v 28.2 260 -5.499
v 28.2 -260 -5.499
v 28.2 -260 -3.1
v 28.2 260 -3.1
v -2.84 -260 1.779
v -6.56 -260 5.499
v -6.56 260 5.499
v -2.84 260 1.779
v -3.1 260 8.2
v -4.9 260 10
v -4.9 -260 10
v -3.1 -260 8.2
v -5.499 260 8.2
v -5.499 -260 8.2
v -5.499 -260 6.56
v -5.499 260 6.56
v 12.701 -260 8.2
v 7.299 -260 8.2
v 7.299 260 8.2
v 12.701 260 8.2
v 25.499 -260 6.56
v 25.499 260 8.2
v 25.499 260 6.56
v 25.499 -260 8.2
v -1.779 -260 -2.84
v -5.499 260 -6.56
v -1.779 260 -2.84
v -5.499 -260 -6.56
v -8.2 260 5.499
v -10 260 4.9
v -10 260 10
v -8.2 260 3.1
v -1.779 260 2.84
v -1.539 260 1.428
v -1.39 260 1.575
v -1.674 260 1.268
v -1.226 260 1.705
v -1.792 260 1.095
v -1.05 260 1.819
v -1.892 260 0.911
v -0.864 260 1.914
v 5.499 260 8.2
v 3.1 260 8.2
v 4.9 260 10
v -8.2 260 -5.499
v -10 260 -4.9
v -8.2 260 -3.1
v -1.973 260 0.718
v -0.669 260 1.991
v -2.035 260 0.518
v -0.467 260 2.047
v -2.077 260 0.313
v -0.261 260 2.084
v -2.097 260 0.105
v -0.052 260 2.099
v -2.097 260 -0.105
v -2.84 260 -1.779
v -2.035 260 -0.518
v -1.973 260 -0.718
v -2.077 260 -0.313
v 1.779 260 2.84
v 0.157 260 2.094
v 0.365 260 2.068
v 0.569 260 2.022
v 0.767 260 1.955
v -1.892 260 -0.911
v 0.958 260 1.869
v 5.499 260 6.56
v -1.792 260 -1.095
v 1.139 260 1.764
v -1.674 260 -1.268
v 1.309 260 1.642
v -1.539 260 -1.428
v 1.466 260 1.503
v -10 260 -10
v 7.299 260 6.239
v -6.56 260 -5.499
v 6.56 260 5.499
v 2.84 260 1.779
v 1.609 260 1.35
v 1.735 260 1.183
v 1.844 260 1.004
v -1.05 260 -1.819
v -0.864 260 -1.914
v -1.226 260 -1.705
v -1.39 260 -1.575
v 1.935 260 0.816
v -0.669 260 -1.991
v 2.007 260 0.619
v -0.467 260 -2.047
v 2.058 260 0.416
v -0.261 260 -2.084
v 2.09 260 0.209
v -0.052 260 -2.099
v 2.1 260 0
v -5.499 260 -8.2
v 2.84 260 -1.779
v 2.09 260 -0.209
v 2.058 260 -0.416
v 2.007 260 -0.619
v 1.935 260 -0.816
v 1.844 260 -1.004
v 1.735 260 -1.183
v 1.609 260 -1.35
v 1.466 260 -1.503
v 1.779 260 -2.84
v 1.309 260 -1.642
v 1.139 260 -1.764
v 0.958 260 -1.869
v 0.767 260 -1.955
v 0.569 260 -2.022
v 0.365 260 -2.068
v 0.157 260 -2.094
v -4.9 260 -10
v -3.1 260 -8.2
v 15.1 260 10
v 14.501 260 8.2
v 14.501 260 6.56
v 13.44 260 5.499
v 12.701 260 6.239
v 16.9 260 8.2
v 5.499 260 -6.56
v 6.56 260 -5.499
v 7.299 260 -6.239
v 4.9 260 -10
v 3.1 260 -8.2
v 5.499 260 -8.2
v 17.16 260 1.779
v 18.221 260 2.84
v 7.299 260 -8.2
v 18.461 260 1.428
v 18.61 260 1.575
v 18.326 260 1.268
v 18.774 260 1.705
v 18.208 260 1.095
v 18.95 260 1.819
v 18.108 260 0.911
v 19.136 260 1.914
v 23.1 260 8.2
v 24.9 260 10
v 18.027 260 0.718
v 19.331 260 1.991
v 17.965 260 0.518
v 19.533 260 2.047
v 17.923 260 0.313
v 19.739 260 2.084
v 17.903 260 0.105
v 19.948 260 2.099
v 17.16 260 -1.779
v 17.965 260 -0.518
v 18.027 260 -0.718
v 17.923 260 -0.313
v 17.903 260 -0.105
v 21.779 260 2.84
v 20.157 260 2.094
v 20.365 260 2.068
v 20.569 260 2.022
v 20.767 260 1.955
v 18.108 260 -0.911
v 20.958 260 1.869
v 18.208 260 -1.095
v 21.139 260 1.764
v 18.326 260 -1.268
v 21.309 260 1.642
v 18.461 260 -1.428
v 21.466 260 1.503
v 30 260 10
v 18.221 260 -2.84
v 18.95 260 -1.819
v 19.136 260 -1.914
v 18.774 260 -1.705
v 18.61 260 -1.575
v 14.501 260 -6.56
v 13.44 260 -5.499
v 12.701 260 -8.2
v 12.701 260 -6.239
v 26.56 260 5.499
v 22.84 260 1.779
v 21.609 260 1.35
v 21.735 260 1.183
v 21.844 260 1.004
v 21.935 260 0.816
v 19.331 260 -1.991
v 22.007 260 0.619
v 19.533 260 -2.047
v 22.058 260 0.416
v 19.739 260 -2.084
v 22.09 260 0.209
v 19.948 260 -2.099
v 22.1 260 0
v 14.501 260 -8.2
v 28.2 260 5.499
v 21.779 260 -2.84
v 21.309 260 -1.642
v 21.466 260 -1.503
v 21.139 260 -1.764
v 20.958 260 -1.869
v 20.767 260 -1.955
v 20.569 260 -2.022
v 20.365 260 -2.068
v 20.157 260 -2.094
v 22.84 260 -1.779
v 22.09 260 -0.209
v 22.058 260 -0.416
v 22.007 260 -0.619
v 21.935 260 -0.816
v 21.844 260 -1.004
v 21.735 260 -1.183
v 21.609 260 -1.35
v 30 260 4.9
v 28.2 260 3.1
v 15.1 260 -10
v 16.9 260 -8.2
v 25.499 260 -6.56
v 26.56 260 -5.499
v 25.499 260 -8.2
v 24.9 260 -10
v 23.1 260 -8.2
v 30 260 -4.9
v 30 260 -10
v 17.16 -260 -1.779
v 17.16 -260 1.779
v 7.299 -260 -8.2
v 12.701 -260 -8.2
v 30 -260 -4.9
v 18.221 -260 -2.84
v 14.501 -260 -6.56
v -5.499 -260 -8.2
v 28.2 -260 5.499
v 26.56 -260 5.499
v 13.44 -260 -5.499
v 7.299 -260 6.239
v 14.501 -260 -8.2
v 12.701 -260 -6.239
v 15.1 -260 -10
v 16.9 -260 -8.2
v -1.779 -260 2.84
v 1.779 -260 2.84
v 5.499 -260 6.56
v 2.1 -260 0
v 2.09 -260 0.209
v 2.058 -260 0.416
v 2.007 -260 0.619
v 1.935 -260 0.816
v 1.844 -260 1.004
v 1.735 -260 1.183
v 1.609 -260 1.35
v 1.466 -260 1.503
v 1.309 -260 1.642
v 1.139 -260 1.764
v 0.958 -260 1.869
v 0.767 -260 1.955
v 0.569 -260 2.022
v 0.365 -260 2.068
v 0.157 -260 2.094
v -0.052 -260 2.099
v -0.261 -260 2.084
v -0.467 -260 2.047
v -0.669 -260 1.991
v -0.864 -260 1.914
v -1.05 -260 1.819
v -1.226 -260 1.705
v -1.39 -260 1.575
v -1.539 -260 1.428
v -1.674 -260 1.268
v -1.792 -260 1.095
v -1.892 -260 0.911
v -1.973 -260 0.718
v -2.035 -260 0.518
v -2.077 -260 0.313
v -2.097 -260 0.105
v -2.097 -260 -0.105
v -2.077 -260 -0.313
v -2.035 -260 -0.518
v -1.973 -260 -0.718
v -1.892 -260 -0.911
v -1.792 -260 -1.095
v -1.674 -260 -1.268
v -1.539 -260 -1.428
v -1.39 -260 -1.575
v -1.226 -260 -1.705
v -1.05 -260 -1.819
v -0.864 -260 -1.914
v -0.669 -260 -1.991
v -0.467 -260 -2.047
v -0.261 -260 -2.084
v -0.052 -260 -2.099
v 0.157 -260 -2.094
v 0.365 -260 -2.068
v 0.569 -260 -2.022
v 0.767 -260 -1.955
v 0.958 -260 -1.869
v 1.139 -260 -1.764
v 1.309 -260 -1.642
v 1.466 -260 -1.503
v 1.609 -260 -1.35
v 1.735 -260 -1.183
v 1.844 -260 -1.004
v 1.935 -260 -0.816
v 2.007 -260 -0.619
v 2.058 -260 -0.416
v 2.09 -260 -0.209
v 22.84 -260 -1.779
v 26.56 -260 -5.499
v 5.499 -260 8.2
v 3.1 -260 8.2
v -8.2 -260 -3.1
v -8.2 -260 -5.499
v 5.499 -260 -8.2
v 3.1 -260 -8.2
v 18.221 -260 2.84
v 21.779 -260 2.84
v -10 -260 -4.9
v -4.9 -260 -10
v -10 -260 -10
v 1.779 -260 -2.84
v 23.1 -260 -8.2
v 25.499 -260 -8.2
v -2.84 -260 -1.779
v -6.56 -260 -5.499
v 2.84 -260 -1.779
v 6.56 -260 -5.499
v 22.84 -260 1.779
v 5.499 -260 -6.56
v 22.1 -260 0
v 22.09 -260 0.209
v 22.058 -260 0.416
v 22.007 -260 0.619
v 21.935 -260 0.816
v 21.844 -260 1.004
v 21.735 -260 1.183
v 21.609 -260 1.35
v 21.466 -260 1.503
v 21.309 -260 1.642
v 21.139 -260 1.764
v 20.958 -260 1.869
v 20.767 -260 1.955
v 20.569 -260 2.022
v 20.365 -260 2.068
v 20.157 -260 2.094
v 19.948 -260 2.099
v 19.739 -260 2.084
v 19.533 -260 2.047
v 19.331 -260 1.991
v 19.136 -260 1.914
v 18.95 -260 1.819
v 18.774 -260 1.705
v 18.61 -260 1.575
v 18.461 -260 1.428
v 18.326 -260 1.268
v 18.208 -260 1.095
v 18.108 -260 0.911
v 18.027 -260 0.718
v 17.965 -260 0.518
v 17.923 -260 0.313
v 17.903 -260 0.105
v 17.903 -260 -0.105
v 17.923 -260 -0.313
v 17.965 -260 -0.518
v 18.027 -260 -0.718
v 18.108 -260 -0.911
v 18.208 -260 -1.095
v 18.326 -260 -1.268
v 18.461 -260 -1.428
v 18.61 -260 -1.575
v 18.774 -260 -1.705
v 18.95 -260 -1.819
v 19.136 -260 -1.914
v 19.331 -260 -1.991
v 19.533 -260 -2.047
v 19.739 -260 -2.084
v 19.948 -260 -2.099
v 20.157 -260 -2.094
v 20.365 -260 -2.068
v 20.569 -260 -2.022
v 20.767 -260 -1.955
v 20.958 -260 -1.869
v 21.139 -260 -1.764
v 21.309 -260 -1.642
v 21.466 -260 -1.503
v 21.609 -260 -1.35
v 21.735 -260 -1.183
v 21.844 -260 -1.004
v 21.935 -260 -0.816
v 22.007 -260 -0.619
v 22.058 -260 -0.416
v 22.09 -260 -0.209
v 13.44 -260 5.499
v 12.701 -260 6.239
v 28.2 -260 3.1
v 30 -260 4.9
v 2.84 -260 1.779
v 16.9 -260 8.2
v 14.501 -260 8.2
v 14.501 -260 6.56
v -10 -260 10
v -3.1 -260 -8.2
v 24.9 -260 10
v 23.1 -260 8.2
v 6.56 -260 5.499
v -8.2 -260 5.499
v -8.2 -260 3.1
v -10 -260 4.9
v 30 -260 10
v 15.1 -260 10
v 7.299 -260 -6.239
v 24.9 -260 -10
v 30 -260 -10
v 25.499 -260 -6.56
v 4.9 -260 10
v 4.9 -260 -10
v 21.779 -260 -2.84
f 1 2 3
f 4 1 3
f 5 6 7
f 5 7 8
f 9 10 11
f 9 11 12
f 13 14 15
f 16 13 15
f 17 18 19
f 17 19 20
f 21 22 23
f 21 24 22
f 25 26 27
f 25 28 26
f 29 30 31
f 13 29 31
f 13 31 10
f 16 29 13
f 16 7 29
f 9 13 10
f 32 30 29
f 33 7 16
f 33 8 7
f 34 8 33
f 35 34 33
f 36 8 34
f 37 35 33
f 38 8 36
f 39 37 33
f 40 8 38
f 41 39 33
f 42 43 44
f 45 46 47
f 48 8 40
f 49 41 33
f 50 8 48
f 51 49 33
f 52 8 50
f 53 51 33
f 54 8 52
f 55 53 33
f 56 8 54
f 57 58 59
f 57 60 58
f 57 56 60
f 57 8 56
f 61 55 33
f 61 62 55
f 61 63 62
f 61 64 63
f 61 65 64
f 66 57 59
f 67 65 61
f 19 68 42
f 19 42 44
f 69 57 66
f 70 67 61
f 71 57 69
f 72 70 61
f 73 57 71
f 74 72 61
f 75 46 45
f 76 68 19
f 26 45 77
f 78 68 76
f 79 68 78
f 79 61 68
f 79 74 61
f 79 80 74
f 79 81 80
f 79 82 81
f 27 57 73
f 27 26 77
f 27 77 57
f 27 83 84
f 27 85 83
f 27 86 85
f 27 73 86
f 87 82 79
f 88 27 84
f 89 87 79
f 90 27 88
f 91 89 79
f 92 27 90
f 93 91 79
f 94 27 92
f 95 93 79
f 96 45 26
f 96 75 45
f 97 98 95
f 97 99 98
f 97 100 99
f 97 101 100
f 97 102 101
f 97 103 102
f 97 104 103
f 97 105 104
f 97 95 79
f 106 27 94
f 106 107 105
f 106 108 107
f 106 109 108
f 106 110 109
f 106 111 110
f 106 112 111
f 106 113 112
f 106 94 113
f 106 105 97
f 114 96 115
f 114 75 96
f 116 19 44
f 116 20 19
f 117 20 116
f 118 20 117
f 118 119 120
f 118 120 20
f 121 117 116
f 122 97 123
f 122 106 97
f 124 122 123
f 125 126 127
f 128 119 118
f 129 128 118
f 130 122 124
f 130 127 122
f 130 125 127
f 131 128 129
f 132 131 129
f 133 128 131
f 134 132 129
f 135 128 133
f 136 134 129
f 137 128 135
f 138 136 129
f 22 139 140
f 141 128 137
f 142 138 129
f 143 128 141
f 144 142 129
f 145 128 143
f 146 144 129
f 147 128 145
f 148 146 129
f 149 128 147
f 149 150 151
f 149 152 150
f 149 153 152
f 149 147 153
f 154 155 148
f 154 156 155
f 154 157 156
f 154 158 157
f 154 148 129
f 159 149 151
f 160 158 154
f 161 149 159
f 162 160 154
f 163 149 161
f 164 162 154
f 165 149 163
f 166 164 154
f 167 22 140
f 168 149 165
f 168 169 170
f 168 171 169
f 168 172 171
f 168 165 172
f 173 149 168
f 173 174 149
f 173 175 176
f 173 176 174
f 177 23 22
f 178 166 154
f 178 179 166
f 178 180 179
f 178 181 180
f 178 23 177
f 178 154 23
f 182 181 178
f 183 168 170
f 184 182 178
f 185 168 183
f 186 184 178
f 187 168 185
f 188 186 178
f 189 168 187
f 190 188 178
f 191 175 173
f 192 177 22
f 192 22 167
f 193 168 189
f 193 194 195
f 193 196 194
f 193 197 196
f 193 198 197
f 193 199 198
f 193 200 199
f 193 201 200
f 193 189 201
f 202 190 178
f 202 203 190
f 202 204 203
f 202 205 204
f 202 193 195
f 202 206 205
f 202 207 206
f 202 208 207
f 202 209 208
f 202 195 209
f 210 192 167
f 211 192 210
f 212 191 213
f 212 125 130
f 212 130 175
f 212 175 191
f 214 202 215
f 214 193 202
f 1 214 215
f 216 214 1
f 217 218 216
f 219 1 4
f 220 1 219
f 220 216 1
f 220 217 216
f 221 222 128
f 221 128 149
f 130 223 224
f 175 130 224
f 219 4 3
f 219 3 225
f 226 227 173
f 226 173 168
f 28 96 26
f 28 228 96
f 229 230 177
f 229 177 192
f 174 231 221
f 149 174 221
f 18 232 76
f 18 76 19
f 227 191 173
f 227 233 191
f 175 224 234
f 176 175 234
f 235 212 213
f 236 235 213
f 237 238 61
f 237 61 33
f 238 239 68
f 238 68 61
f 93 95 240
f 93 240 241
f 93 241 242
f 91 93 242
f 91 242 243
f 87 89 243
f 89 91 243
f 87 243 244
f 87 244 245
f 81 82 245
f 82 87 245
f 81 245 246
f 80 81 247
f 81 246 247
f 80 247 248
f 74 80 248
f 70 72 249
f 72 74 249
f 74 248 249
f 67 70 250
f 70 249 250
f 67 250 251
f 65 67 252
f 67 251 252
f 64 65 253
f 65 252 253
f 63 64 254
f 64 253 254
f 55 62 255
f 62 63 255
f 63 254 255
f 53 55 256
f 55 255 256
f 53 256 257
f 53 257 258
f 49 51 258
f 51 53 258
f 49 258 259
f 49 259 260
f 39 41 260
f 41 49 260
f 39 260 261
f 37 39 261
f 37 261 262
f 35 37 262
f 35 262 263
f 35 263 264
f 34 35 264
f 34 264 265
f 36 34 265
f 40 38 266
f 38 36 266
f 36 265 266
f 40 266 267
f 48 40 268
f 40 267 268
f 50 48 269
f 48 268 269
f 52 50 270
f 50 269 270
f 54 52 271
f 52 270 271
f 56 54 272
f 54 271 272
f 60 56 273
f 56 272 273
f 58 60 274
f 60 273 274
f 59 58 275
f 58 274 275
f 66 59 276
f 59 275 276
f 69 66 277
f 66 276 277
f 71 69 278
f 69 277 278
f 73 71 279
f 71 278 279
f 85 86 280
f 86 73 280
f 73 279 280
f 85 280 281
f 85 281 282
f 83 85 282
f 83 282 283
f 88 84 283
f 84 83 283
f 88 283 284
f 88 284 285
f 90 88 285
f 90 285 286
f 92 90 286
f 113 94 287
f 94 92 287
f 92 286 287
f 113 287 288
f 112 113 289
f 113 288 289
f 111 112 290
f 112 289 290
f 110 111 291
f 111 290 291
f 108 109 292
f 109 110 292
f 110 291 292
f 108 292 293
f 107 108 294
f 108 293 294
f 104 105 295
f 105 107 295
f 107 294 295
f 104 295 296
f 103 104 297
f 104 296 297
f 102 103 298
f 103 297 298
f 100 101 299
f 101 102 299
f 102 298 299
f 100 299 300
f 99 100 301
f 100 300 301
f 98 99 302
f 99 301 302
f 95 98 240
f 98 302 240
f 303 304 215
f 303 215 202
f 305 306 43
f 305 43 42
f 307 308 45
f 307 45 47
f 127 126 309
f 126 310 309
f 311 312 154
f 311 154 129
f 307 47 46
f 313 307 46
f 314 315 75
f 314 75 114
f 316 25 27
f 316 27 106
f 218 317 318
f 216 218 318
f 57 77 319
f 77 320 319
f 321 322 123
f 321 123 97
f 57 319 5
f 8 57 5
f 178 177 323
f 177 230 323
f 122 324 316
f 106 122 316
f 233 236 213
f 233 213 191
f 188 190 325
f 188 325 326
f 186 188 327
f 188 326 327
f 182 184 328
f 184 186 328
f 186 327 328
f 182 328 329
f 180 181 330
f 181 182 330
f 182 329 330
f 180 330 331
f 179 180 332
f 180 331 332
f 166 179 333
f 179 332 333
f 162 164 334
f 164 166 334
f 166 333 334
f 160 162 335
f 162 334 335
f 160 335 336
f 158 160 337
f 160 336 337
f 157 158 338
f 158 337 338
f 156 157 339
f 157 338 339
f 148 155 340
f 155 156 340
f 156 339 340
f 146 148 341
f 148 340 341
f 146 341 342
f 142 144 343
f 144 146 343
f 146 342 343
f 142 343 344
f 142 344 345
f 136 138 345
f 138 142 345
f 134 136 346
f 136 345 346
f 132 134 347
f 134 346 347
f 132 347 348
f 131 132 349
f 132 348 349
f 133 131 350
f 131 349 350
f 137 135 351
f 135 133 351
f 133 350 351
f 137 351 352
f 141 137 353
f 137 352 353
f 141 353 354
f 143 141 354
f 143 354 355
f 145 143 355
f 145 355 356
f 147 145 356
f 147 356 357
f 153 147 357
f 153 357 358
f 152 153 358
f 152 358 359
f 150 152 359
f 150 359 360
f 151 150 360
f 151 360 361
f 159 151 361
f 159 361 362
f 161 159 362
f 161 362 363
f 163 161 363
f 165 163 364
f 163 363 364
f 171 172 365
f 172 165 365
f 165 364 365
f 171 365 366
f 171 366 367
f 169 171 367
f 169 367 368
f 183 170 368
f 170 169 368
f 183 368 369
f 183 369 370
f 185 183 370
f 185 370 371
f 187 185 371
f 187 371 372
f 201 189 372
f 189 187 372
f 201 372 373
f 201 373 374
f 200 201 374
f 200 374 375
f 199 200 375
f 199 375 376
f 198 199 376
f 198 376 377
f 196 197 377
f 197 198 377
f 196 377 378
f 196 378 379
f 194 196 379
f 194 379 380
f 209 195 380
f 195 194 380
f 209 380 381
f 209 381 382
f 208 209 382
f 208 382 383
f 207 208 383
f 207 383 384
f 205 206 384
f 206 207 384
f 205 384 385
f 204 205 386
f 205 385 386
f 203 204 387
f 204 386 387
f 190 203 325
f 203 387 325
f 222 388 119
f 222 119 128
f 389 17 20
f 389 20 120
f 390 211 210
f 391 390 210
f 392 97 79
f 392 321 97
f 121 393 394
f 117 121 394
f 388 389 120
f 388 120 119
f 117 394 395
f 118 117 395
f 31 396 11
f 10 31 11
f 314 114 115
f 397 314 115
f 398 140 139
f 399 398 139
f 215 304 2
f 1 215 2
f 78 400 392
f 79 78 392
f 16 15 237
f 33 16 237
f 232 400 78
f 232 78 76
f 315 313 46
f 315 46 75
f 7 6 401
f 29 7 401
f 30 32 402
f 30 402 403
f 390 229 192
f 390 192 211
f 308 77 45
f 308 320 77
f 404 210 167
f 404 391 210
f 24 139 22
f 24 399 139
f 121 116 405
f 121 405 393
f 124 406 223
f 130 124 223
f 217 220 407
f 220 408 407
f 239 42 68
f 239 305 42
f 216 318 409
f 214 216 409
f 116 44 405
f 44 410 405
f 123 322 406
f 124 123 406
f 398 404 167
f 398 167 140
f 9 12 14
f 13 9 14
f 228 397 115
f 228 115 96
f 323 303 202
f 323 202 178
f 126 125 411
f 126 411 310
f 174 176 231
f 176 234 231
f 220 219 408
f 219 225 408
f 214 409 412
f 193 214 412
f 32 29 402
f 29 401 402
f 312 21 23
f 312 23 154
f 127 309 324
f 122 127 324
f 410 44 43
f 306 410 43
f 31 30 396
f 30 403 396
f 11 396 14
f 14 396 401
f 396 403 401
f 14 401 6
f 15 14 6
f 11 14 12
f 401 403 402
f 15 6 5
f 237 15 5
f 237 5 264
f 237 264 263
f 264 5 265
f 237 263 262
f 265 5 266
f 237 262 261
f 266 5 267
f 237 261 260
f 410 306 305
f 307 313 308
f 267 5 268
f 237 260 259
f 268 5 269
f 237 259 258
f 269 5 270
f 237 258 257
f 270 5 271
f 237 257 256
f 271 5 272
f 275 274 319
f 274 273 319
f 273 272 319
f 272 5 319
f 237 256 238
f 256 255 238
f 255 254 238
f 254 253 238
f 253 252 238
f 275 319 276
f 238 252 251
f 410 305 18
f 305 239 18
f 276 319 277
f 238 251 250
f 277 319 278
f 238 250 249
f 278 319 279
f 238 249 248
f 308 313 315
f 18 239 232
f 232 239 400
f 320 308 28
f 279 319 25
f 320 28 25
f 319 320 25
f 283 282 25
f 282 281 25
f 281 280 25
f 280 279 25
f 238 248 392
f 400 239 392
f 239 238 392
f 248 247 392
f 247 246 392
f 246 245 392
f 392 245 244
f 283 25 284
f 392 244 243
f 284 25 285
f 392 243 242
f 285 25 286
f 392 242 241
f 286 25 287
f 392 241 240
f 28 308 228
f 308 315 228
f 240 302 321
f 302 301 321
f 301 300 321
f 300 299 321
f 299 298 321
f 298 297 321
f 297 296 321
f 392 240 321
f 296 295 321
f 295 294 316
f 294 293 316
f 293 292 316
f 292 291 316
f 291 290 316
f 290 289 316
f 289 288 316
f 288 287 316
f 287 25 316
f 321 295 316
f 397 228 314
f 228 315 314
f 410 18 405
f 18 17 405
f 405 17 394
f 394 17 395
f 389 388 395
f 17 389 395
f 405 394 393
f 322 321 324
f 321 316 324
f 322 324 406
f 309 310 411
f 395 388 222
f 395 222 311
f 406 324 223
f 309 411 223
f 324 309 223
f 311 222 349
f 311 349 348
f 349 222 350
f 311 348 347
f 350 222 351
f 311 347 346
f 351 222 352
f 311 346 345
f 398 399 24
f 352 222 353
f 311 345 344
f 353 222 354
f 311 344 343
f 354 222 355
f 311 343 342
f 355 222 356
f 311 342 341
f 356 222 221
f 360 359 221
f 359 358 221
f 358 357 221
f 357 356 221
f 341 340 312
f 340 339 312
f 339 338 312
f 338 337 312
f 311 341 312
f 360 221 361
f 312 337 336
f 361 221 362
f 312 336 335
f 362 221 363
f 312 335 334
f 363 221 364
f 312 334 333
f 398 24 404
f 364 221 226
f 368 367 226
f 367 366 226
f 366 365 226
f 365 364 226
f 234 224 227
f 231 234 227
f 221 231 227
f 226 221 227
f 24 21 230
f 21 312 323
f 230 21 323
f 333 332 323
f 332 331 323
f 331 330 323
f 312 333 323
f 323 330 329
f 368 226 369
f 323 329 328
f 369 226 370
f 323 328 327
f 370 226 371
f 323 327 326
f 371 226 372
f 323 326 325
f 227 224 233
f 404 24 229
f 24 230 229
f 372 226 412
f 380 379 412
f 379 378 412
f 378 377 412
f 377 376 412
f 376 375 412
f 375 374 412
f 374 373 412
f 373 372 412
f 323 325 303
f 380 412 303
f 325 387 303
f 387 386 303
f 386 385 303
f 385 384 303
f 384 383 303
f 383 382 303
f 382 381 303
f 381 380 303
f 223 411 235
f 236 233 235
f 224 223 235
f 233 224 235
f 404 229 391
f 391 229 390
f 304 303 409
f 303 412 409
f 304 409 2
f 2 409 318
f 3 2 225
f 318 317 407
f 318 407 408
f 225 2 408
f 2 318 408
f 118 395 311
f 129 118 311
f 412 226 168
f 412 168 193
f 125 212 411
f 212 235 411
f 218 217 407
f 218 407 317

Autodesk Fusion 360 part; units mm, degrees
sketch "Sketch1" plane through (0, 0, 0) normal (0, 1, 0) x (1, 0, 0)
  circle A0 centre (0, 0) radius 2.1
  line L0 (-6.56, 5.4993) -> (-8.2, 5.4993)
  line L1 (-8.2, 5.4993) -> (-8.2, 3.1)
  line L2 (-8.2, 3.1) -> (-10, 4.9)
  line L3 (-10, 4.9) -> (-10, 10)
  line L4 (-10, 10) -> (-4.9, 10)
  line L5 (-4.9, 10) -> (-3.1, 8.2)
  line L6 (-3.1, 8.2) -> (-5.4993, 8.2)
  line L7 (-5.4993, 8.2) -> (-5.4993, 6.56)
  line L8 (-5.4993, 6.56) -> (-1.7793, 2.84)
  line L9 (-6.56, 5.4993) -> (-2.84, 1.7793)
  line L10 (0, 0) -> (-10, 10) construction
  line L11 (0, 0) -> (0, 5) construction
  line L12 (0, 0) -> (-5, 0) construction
  line L13 (-2.84, 1.7793) -> (-2.84, 0)
  line L14 (-1.7793, 2.84) -> (0, 2.84)
  line L15 (-8.2, -3.1) -> (-10, -4.9)
  line L16 (-6.56, -5.4993) -> (-8.2, -5.4993)
  line L17 (-10, -4.9) -> (-10, -10)
  line L18 (-4.9, -10) -> (-3.1, -8.2)
  line L19 (-5.4993, -6.56) -> (-1.7793, -2.84)
  line L20 (-6.56, -5.4993) -> (-2.84, -1.7793)
  line L21 (-1.7793, -2.84) -> (0, -2.84)
  line L22 (-3.1, -8.2) -> (-5.4993, -8.2)
  line L23 (-8.2, -5.4993) -> (-8.2, -3.1)
  line L24 (-10, -10) -> (-4.9, -10)
  line L25 (-5.4993, -8.2) -> (-5.4993, -6.56)
  line L26 (-2.84, -1.7793) -> (-2.84, 0)
  line L27 (4.9, 10) -> (3.1, 8.2)
  line L28 (2.84, -1.7793) -> (2.84, 0)
  line L29 (6.56, -5.4993) -> (2.84, -1.7793)
  line L30 (1.7793, 2.84) -> (0, 2.84)
  line L31 (5.4993, -8.2) -> (5.4993, -6.56)
  line L32 (5.4993, -6.56) -> (1.7793, -2.84)
  line L33 (10, 10) -> (4.9, 10)
  line L34 (2.84, 1.7793) -> (2.84, 0)
  line L35 (3.1, 8.2) -> (5.4993, 8.2)
  line L36 (10, -10) -> (4.9, -10)
  line L37 (1.7793, -2.84) -> (0, -2.84)
  line L38 (5.4993, 6.56) -> (1.7793, 2.84)
  line L39 (4.9, -10) -> (3.1, -8.2)
  line L40 (6.56, 5.4993) -> (2.84, 1.7793)
  line L41 (5.4993, 8.2) -> (5.4993, 6.56)
  line L42 (3.1, -8.2) -> (5.4993, -8.2)
  line L43 (10, -4.9) -> (10, 4.9) construction
  line L44 (20, 0) -> (30, 10) construction
  line L45 (26.56, -5.4993) -> (28.2, -5.4993)
  line L46 (23.1, 8.2) -> (25.4993, 8.2)
  line L47 (30, 4.9) -> (30, 10)
  line L48 (26.56, 5.4993) -> (22.84, 1.7793)
  line L49 (22.84, -1.7793) -> (22.84, 0)
  line L50 (30, -4.9) -> (30, -10)
  line L51 (25.4993, -8.2) -> (25.4993, -6.56)
  line L52 (23.1, -8.2) -> (25.4993, -8.2)
  line L53 (28.2, 5.4993) -> (28.2, 3.1)
  line L54 (28.2, 3.1) -> (30, 4.9)
  line L55 (20, 0) -> (20, 5) construction
  line L56 (20, 0) -> (25, 0) construction
  line L57 (30, -10) -> (24.9, -10)
  line L58 (26.56, -5.4993) -> (22.84, -1.7793)
  line L59 (24.9, -10) -> (23.1, -8.2)
  line L60 (25.4993, 8.2) -> (25.4993, 6.56)
  line L61 (28.2, -3.1) -> (30, -4.9)
  line L62 (22.84, 1.7793) -> (22.84, 0)
  line L63 (28.2, -5.4993) -> (28.2, -3.1)
  line L64 (10, -10) -> (15.1, -10)
  line L65 (16.9, 8.2) -> (14.5007, 8.2)
  line L66 (18.2207, 2.84) -> (20, 2.84)
  line L67 (14.5007, -6.56) -> (18.2207, -2.84)
  line L68 (15.1, 10) -> (16.9, 8.2)
  line L69 (13.44, 5.4993) -> (17.16, 1.7793)
  line L70 (18.2207, -2.84) -> (20, -2.84)
  line L71 (17.16, 1.7793) -> (17.16, 0)
  line L72 (15.1, -10) -> (16.9, -8.2)
  line L73 (14.5007, 6.56) -> (18.2207, 2.84)
  line L74 (17.16, -1.7793) -> (17.16, 0)
  line L75 (21.7793, 2.84) -> (20, 2.84)
  line L76 (30, 10) -> (24.9, 10)
  line L77 (26.56, 5.4993) -> (28.2, 5.4993)
  line L78 (24.9, 10) -> (23.1, 8.2)
  line L79 (25.4993, -6.56) -> (21.7793, -2.84)
  line L80 (14.5007, 8.2) -> (14.5007, 6.56)
  line L81 (10, 10) -> (15.1, 10)
  circle A1 centre (20, 0) radius 2.1
  line L82 (14.5007, -8.2) -> (14.5007, -6.56)
  line L83 (21.7793, -2.84) -> (20, -2.84)
  line L84 (16.9, -8.2) -> (14.5007, -8.2)
  line L85 (25.4993, 6.56) -> (21.7793, 2.84)
  line L86 (13.44, -5.4993) -> (17.16, -1.7793)
  line L87 (6.56, 5.4993) -> (7.2993, 6.2387)
  line L88 (7.2993, 6.2387) -> (7.2993, 8.2)
  line L89 (7.2993, 8.2) -> (12.7007, 8.2)
  line L90 (12.7007, 8.2) -> (12.7007, 6.2387)
  line L91 (12.7007, 6.2387) -> (13.44, 5.4993)
  line L92 (6.56, -5.4993) -> (7.2993, -6.2387)
  line L93 (7.2993, -6.2387) -> (7.2993, -8.2)
  line L94 (7.2993, -8.2) -> (12.7007, -8.2)
  line L95 (12.7007, -8.2) -> (12.7007, -6.2387)
  line L96 (12.7007, -6.2387) -> (13.44, -5.4993)
  point P0 (5, 0)
  point P1 (15, 0)
  point P2 (20, 0)
  point P3 (20, 0)
  dimension "d1" = 4.2
  dimension "d2" = 10
  dimension "d3" = 10
  dimension "d4" = 3.1
  dimension "d5" = 1.8
  dimension "d6" = 0
  dimension "d7" = 1.5
  dimension "d8" = 1.64
  dimension "d9" = 135
  dimension "d10" = 0
  dimension "d11" = 2.84
  dimension "d12" = 0
  dimension "d13" = 0
  dimension "d14" = 20
  dimension "d15" = 0
  dimension "d16" = 0
extrude "Extrude1" add sketch "Sketch1" along normal mid plane 520
equation "d4 = ( 6.2 / 2 ) * 1 mm"
equation "d6 = d10"
equation "d10 = d9"
equation "d11 = ( 5.68 / 2 ) * 1 mm"
equation "d12 = d19"
equation "d13 = d13"
equation "d15 = d10"
equation "d16 = d29"
